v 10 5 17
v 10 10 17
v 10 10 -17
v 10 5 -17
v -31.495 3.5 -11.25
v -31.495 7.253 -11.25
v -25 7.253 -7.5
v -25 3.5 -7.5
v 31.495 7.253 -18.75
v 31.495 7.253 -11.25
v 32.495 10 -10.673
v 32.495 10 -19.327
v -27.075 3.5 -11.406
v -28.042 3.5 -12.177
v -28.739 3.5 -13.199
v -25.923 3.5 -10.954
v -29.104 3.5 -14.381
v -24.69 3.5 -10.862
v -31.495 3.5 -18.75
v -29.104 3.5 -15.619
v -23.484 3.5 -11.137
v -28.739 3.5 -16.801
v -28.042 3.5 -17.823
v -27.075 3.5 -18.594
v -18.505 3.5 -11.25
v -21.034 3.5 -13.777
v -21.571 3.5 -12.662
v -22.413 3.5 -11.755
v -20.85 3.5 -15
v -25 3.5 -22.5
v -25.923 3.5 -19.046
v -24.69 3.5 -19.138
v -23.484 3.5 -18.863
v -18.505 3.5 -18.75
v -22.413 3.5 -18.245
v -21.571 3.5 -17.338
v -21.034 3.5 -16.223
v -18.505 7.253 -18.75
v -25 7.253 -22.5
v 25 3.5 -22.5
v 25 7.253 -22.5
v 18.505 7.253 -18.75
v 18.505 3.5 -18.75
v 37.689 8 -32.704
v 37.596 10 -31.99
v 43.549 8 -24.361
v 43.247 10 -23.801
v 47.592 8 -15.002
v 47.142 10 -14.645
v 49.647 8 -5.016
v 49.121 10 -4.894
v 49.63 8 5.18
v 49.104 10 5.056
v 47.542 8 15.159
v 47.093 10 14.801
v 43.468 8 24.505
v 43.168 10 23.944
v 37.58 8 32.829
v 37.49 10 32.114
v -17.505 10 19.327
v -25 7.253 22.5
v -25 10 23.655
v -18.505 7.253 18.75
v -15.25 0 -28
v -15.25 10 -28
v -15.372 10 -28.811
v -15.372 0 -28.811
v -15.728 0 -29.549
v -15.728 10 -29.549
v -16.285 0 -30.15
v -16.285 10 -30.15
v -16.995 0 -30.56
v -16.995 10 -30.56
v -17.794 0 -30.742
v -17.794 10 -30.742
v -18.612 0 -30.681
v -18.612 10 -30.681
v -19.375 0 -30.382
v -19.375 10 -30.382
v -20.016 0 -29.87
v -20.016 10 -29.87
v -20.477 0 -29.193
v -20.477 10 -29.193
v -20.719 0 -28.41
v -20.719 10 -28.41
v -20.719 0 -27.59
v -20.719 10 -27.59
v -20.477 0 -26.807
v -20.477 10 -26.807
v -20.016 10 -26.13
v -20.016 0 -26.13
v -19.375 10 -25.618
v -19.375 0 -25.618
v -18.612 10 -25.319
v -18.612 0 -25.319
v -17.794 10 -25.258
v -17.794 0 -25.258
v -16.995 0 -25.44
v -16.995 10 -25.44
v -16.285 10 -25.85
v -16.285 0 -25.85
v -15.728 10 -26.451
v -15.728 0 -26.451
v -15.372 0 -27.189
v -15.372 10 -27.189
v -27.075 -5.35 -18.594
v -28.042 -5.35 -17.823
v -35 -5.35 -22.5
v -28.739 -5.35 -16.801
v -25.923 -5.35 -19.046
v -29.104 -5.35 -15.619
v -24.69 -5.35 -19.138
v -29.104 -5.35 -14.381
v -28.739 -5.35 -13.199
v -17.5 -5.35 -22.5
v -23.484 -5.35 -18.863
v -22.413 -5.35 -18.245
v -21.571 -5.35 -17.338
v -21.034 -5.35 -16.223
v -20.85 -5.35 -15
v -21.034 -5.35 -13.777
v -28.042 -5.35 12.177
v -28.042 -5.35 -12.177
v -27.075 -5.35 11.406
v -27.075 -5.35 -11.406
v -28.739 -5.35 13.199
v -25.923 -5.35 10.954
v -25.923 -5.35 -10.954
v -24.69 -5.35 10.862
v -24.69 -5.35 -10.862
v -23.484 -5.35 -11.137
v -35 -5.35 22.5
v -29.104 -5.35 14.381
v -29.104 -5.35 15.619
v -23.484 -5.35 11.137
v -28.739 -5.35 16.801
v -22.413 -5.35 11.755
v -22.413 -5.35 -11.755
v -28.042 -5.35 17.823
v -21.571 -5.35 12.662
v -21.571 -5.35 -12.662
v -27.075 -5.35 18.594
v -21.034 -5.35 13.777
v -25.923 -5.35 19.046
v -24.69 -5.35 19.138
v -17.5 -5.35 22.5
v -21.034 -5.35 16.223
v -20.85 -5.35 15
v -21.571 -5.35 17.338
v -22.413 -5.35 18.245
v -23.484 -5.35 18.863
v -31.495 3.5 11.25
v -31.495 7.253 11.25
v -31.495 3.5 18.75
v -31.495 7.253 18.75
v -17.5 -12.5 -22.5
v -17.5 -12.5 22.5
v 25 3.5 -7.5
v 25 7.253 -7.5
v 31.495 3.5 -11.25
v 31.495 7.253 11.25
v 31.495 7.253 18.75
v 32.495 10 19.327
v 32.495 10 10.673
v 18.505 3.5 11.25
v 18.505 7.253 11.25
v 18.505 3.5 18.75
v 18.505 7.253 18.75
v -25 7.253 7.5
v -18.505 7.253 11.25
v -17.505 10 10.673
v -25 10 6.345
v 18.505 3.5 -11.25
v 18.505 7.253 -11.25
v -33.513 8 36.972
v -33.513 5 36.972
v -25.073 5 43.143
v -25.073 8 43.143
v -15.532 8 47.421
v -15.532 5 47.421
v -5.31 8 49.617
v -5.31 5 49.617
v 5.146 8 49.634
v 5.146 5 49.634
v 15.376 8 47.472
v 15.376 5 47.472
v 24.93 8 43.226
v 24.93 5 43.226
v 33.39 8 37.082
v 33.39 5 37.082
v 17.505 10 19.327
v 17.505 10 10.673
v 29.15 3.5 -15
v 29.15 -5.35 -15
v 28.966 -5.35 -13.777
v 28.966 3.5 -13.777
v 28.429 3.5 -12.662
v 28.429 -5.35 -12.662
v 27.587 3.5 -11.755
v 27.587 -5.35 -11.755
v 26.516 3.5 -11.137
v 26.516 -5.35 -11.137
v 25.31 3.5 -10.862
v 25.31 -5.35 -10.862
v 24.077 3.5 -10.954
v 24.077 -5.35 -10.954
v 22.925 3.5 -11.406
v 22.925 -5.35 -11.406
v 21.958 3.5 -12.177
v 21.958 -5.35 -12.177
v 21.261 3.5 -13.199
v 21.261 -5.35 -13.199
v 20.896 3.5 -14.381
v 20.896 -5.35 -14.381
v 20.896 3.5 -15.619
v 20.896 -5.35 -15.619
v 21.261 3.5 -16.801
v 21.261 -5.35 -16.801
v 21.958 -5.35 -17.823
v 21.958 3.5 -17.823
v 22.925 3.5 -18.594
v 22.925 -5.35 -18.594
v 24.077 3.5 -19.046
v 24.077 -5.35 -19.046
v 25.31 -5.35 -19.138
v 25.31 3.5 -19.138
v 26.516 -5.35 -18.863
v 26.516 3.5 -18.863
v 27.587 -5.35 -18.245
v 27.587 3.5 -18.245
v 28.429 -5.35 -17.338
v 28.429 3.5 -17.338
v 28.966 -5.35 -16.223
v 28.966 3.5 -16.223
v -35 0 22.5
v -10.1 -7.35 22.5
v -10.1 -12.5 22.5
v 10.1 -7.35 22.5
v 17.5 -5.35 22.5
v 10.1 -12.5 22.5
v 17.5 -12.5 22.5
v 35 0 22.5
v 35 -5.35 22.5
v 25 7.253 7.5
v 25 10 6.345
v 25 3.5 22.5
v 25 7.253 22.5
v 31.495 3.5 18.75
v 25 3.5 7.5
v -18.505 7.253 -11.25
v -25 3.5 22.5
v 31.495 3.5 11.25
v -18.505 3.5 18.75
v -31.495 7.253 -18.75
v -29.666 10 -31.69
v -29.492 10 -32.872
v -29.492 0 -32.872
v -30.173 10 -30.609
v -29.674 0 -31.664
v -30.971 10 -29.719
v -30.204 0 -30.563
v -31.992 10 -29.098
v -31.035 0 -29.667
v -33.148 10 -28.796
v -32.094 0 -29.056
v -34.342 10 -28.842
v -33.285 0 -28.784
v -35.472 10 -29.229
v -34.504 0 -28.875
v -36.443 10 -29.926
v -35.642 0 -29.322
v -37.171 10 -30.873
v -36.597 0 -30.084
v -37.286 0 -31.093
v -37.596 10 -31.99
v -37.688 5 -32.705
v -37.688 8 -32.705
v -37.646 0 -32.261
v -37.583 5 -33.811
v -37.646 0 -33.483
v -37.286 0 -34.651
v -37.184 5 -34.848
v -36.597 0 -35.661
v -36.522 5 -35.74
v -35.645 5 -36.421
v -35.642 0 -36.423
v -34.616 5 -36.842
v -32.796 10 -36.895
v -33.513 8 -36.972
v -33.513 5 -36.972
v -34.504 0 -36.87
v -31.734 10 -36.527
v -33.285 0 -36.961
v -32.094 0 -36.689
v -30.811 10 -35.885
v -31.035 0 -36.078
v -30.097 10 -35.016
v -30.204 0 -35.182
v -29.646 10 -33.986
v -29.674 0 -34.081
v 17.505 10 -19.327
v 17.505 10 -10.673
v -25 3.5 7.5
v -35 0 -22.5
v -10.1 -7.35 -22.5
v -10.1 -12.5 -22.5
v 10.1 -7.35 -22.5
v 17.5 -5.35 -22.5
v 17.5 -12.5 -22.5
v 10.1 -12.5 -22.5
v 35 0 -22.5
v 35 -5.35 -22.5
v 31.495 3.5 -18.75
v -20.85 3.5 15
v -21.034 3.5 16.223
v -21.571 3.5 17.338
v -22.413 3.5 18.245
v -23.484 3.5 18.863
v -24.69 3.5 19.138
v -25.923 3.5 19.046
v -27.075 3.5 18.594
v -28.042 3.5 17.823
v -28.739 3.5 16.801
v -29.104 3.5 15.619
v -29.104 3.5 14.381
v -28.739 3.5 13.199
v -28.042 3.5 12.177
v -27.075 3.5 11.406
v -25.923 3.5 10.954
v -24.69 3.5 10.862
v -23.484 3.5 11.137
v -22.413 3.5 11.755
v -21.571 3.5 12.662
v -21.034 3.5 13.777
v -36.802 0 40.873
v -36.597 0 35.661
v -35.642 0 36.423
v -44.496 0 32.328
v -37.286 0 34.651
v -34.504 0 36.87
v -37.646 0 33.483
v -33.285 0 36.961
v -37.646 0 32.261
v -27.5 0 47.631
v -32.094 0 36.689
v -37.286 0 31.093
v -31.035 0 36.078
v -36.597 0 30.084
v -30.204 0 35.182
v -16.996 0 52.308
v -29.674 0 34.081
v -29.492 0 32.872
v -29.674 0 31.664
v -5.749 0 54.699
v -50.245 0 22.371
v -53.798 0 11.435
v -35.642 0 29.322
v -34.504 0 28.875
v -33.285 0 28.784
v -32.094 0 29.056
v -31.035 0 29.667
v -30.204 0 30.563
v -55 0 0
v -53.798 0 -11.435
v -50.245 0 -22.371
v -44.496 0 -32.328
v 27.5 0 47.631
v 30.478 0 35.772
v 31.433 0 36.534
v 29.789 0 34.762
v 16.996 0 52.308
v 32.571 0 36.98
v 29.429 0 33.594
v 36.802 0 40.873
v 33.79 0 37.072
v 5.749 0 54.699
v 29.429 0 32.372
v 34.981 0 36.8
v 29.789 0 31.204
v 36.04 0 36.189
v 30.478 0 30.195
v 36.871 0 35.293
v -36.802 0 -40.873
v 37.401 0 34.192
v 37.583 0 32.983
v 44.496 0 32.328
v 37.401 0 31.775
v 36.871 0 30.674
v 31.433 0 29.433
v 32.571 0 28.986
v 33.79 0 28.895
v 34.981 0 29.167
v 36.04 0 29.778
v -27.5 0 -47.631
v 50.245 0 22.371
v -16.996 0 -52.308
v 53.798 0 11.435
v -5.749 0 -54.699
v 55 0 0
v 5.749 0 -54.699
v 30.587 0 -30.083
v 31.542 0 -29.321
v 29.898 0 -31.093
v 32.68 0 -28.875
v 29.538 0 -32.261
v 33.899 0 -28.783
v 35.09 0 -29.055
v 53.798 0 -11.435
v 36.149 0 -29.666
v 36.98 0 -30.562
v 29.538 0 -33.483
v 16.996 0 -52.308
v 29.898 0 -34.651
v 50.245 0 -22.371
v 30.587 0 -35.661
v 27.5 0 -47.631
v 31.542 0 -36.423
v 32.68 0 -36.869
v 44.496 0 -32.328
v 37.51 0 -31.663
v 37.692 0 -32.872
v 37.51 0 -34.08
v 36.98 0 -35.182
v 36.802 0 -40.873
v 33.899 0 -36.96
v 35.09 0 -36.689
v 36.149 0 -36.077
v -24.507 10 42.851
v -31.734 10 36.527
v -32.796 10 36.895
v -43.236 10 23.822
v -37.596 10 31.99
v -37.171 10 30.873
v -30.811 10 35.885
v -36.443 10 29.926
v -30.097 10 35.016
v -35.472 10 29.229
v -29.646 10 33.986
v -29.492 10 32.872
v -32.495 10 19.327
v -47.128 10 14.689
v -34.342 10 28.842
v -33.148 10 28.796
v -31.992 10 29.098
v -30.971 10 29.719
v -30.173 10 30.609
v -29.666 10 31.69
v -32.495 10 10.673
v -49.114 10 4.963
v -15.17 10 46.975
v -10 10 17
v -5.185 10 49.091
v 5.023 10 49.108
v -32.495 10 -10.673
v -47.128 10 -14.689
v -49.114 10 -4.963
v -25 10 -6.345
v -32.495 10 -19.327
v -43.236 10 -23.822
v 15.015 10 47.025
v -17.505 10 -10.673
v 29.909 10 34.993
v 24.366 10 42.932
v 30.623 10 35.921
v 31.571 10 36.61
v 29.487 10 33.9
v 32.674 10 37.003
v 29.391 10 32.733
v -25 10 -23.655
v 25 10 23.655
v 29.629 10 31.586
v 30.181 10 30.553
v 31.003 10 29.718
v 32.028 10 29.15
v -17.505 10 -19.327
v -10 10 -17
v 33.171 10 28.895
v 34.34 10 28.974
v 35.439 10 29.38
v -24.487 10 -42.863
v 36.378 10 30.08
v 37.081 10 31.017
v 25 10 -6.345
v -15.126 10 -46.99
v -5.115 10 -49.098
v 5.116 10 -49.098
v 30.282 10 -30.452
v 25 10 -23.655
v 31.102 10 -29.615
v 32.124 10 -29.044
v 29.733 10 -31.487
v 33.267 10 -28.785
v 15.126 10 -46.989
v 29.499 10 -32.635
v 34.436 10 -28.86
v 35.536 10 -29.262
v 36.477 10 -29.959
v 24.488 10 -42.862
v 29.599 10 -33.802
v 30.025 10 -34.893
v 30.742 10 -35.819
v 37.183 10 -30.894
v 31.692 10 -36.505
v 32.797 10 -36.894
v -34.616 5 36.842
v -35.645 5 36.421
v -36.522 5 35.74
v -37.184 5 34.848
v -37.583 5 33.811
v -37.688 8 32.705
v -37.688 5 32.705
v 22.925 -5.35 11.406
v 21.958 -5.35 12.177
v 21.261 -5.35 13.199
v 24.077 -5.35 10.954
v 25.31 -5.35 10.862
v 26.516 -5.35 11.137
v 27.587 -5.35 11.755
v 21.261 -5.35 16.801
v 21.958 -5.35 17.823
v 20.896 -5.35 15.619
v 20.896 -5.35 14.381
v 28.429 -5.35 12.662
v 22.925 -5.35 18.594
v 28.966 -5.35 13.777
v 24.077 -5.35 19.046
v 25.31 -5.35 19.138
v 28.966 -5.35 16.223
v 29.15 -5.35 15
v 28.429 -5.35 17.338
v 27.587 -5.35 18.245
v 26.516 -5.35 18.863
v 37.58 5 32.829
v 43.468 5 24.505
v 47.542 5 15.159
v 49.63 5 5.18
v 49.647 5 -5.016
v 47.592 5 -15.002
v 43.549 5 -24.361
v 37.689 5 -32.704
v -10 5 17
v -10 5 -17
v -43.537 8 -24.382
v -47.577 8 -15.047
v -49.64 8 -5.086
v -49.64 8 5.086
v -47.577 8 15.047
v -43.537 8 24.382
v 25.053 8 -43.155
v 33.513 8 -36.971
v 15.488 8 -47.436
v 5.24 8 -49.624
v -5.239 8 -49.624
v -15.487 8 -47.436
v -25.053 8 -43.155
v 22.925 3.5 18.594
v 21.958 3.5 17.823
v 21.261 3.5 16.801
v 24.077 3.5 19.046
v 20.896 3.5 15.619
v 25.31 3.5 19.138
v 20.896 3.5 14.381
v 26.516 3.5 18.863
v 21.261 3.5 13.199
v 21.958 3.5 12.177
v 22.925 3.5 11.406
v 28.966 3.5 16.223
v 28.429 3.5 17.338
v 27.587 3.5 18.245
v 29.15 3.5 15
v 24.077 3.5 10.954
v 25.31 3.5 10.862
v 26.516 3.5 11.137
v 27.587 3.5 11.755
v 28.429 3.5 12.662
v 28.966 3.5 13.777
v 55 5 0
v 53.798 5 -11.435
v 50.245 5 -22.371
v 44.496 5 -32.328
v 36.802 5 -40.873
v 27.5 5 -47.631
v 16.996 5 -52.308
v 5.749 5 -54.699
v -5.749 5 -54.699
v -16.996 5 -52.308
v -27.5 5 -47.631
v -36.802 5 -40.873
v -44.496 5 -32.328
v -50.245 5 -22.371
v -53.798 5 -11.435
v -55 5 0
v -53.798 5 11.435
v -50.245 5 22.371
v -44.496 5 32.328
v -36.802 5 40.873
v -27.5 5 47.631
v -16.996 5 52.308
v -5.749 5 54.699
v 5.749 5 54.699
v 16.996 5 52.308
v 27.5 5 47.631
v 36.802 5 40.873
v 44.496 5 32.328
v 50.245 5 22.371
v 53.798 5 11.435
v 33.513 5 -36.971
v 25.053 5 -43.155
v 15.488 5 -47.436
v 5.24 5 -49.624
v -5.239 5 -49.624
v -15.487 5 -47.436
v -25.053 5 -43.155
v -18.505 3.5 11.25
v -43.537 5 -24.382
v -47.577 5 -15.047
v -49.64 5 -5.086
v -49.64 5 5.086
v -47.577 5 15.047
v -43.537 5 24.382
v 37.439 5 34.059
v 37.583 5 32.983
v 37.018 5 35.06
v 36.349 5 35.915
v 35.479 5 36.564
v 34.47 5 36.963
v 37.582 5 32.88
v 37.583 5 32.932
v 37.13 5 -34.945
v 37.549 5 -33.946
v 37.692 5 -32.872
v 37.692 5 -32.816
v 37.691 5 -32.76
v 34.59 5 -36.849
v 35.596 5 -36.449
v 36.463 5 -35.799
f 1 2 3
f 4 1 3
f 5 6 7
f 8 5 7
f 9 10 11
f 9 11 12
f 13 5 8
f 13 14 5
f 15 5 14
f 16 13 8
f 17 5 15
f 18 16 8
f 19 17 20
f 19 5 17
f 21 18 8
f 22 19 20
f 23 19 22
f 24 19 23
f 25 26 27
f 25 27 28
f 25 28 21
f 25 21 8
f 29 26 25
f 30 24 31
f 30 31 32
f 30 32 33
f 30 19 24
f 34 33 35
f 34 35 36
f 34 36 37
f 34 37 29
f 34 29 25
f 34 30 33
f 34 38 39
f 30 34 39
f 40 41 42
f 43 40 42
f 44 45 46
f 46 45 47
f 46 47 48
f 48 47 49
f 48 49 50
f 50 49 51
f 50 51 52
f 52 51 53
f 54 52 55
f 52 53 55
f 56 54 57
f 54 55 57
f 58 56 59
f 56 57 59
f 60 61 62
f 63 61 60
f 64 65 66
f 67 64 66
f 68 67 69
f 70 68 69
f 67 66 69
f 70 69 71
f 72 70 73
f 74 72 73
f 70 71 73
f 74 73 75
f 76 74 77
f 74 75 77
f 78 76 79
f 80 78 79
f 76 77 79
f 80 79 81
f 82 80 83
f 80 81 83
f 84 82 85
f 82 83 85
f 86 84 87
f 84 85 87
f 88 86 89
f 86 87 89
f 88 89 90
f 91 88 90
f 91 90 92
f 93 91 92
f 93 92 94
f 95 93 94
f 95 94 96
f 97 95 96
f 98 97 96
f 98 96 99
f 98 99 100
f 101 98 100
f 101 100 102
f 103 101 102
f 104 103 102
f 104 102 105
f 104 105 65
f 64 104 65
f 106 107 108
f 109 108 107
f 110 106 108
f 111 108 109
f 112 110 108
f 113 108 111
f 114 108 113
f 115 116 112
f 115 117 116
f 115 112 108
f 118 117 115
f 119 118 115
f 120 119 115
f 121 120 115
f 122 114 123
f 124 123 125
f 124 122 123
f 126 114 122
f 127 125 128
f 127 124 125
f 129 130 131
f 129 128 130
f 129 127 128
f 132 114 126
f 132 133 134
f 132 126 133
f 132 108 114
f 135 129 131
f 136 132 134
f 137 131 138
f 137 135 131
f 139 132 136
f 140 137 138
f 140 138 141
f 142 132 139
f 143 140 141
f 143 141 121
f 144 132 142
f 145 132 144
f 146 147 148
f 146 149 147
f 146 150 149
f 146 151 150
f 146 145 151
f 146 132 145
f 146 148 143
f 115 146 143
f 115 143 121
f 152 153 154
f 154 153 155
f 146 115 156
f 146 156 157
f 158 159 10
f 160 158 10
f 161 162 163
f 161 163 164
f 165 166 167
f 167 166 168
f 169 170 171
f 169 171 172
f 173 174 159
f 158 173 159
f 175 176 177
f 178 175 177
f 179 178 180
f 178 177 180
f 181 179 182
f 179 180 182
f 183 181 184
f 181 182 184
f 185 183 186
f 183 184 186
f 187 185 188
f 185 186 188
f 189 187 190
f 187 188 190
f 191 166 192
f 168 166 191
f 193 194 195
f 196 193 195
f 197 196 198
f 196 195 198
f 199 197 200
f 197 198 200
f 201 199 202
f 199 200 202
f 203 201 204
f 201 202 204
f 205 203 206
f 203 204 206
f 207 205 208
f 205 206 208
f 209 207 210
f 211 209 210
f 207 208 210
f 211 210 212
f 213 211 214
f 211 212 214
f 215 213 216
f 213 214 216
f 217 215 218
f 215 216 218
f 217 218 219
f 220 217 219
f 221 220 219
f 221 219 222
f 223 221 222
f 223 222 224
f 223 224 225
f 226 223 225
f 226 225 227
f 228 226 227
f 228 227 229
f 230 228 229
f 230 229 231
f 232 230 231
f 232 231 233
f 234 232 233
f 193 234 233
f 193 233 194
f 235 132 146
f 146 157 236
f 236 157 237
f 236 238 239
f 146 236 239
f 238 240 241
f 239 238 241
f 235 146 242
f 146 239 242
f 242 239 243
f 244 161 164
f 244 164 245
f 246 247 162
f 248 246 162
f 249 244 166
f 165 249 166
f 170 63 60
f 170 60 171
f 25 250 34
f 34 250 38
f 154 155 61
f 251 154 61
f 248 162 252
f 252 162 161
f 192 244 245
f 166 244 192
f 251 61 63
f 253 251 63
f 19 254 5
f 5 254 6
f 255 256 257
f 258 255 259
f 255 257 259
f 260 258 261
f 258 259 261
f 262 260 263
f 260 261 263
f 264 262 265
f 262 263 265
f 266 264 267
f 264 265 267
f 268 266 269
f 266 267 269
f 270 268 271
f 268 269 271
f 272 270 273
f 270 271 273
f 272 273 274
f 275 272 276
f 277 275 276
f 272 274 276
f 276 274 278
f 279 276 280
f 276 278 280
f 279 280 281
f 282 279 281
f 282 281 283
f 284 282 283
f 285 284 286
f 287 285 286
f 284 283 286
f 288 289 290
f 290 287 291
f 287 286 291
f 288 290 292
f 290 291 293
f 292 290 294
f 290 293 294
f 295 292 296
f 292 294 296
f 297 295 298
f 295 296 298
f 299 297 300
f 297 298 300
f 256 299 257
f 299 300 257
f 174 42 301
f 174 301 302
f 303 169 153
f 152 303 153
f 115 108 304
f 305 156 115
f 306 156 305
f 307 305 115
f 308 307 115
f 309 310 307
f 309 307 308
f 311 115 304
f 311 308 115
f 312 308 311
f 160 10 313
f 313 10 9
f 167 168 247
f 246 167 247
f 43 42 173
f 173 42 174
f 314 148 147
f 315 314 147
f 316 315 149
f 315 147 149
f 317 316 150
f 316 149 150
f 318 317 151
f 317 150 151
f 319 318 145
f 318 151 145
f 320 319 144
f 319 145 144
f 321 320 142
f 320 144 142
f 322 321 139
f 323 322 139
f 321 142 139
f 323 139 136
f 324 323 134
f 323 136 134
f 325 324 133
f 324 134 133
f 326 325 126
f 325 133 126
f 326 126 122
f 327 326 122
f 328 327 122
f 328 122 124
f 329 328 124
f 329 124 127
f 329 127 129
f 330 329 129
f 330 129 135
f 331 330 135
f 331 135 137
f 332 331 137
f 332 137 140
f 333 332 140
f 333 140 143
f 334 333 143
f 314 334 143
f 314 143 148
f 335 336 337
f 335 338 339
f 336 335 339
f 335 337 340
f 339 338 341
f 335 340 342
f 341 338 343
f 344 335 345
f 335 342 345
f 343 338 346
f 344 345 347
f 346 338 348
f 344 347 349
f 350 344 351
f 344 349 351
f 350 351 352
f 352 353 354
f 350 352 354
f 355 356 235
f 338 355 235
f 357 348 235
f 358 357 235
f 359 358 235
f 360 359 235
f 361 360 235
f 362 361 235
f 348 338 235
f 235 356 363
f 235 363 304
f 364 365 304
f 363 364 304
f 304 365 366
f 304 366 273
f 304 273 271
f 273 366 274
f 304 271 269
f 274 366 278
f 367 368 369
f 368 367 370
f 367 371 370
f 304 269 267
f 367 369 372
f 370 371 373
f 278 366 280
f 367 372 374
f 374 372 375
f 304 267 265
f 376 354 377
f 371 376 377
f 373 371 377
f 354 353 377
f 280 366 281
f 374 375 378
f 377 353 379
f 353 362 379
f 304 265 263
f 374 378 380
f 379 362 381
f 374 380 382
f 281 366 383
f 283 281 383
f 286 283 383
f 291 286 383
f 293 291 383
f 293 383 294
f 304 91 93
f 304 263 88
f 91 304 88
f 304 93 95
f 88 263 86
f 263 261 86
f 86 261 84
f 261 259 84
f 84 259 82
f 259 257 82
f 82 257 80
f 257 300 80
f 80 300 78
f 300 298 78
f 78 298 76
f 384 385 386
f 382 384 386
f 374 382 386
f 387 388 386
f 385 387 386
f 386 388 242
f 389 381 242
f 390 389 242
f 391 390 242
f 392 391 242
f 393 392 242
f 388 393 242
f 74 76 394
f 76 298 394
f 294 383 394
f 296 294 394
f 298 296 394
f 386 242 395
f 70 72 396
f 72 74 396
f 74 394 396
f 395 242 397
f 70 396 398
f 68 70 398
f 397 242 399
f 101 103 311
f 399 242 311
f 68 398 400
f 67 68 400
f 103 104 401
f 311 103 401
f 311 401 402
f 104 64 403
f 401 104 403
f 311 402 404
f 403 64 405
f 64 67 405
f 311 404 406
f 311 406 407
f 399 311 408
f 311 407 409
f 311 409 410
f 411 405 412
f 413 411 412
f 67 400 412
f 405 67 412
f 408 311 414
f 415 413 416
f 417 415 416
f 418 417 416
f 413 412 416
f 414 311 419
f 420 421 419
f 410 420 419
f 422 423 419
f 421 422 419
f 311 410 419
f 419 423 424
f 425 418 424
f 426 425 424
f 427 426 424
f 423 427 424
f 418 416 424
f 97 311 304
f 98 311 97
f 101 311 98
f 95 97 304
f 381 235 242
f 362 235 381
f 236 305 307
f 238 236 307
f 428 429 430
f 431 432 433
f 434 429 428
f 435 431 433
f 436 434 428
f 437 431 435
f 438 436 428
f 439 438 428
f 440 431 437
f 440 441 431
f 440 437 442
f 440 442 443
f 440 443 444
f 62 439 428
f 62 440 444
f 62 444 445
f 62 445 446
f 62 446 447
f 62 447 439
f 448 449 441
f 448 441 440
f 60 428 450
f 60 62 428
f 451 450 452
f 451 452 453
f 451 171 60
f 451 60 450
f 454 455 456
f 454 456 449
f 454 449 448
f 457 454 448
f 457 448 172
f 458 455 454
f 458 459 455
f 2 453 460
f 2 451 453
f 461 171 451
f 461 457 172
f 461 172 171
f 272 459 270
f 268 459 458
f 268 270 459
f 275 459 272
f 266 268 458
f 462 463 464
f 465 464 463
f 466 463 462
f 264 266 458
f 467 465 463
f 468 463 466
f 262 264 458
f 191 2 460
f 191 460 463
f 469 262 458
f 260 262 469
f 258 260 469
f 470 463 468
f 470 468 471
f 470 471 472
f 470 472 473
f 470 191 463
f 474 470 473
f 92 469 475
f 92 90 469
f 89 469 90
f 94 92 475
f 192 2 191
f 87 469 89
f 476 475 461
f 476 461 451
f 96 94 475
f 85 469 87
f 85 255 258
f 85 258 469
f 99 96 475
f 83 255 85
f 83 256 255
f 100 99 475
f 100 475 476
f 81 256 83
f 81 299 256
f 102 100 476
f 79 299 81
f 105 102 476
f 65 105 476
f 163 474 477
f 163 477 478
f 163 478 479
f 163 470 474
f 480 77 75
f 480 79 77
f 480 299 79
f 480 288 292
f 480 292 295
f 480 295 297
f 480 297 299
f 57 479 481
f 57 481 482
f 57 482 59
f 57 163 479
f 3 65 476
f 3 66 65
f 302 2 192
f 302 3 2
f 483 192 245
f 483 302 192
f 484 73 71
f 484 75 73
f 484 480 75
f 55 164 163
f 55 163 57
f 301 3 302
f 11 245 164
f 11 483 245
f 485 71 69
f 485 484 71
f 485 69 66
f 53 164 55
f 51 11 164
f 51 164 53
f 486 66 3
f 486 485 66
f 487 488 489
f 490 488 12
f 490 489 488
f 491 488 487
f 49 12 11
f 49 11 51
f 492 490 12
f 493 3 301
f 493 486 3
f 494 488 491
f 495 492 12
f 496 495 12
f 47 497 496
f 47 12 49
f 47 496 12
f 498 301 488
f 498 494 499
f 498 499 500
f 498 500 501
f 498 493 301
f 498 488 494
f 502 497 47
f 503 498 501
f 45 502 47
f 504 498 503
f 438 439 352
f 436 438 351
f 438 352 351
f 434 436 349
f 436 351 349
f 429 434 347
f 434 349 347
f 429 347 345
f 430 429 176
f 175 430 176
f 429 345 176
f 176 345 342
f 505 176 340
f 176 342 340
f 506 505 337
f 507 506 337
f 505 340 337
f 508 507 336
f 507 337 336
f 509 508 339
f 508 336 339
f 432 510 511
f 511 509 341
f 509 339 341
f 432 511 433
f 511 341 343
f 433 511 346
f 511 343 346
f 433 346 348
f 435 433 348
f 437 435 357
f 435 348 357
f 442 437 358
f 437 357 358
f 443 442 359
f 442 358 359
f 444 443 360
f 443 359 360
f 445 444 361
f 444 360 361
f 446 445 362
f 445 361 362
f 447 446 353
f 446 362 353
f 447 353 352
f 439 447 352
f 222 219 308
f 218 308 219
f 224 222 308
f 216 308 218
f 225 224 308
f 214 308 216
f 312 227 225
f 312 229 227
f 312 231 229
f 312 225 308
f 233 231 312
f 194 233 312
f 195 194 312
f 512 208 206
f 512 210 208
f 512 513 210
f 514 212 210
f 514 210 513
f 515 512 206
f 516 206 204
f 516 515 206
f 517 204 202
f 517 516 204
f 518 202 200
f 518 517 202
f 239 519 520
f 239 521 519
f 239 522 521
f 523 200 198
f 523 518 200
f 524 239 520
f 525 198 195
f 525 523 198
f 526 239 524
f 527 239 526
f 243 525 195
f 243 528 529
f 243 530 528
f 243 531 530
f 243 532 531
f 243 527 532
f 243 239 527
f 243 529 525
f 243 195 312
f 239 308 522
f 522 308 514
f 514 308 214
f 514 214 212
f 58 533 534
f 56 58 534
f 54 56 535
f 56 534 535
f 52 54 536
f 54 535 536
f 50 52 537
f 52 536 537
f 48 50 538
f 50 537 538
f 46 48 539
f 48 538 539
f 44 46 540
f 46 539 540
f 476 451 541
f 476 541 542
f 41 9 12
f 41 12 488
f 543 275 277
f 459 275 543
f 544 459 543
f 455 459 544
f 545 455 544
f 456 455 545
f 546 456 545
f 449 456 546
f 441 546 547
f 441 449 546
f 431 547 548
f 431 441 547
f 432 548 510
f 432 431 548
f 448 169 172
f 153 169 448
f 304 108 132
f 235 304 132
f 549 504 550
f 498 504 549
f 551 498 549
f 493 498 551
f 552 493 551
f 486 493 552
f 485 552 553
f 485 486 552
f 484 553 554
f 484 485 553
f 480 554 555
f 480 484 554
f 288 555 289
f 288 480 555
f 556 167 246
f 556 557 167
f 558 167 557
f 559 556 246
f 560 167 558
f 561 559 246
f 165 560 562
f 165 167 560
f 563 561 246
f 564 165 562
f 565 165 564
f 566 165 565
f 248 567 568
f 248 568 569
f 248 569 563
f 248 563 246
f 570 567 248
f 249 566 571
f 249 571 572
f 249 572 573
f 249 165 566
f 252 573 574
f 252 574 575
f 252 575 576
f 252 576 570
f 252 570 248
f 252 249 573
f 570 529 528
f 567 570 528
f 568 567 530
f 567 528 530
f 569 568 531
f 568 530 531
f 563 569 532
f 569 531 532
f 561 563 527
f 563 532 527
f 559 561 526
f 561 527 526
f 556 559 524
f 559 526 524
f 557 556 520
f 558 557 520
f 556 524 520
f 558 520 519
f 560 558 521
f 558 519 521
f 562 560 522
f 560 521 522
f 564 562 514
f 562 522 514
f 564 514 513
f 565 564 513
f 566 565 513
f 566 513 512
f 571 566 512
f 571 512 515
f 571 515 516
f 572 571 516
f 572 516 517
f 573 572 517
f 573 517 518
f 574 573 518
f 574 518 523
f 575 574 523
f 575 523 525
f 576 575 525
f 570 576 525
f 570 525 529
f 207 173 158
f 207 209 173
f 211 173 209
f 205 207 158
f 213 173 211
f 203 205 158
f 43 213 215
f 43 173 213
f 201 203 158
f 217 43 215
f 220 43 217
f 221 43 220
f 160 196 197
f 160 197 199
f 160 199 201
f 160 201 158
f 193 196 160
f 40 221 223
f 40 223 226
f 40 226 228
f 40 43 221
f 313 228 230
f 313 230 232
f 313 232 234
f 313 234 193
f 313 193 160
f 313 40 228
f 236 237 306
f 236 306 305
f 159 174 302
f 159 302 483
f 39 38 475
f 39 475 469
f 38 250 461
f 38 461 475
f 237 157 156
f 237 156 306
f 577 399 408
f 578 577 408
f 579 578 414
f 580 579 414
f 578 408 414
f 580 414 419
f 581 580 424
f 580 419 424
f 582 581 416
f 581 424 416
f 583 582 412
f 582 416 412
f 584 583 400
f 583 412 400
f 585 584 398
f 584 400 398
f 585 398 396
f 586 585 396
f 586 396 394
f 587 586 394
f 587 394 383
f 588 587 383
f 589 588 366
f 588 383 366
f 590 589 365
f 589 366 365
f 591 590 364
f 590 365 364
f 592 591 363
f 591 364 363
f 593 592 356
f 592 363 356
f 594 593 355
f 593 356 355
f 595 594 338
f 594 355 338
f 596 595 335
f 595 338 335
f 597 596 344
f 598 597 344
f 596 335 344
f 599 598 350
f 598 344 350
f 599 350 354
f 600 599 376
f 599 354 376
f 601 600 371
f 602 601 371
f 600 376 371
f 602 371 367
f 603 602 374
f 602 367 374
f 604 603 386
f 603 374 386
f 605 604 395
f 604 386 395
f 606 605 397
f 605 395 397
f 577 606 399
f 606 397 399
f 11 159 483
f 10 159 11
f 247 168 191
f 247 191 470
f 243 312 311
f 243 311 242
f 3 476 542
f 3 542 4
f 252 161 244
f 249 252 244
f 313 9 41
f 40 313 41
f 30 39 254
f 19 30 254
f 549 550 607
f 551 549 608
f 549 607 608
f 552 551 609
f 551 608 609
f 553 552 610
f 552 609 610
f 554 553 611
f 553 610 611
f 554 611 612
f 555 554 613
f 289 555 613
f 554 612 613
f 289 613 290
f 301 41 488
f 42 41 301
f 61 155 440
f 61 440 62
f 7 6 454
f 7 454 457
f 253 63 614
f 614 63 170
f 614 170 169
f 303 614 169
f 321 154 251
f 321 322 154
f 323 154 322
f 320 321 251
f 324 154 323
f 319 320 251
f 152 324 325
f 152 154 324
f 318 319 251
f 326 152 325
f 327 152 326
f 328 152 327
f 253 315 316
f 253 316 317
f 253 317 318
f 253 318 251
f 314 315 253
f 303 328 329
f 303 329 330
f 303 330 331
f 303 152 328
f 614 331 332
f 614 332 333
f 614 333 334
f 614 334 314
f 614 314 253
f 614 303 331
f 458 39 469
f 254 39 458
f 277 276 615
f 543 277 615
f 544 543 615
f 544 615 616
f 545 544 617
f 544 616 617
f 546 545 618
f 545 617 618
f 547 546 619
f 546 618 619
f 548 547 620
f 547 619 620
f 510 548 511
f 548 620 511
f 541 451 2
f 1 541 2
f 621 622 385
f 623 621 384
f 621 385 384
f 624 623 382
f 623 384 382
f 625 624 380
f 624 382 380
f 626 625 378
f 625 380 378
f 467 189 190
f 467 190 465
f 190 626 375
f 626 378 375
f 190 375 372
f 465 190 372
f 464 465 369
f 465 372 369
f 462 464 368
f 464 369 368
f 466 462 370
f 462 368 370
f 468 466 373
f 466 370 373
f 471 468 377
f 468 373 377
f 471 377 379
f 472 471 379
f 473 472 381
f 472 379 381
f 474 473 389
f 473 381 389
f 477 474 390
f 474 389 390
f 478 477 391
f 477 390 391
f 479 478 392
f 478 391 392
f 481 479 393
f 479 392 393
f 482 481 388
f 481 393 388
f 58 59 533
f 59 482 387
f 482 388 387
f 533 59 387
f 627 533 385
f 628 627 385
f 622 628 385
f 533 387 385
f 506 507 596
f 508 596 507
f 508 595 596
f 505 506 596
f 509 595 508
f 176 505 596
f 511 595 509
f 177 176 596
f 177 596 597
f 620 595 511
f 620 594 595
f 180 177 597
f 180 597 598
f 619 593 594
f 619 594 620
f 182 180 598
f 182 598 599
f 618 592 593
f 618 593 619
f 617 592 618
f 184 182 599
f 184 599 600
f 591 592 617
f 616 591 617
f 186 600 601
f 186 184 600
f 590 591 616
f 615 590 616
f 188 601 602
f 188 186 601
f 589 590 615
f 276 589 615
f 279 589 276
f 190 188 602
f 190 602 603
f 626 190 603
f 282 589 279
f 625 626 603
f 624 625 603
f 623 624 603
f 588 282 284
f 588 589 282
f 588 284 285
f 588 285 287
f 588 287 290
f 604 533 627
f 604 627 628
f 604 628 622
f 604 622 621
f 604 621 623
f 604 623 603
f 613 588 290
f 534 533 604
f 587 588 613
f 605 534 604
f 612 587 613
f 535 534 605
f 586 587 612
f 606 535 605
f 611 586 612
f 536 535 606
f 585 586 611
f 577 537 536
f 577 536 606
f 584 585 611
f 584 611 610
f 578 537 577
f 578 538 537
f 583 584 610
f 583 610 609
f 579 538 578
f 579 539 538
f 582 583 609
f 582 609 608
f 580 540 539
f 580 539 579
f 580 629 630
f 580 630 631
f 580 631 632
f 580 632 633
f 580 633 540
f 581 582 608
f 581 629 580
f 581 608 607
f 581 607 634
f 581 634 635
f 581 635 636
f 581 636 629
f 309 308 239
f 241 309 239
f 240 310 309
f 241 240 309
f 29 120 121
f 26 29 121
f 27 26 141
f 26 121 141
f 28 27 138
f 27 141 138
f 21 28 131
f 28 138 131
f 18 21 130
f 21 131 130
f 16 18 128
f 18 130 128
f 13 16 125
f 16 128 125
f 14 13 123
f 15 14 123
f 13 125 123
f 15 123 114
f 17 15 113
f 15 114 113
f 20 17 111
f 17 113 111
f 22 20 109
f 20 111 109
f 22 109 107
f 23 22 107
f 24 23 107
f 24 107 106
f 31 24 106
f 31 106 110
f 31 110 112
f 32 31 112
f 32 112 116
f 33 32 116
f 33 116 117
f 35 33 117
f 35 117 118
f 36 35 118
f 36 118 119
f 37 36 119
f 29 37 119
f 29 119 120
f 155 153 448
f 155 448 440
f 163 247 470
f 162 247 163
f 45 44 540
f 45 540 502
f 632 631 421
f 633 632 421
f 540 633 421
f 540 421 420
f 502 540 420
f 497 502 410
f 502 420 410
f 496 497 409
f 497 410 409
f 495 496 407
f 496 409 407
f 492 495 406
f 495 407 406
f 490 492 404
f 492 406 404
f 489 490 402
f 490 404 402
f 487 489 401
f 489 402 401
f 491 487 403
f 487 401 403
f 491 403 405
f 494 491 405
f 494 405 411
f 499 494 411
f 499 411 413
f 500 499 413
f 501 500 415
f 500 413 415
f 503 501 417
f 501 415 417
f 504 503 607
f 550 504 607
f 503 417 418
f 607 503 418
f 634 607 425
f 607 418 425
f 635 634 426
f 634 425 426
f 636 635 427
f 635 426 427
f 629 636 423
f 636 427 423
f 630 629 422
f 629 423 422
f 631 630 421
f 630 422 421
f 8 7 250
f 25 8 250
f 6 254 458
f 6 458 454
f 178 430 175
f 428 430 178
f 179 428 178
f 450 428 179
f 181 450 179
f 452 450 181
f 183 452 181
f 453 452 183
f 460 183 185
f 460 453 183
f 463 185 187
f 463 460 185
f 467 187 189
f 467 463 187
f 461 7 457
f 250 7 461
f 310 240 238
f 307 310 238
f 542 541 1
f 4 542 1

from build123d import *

# Parameters (mm, degrees)
SKETCH_1_R            = 55
EXTRUDE_1_DEPTH       = 5
SKETCH_2_R            = 49.9
EXTRUDE_2_DEPTH       = 5
SKETCH_3_W            = 35
SKETCH_3_H            = 45
EXTRUDE_3_DEPTH       = 25
SKETCH_4_W            = 20.2
SKETCH_4_H            = 10.3
CUT_EXTRUDE_1_DEPTH   = 78.5
SKETCH_5_R            = 4.1
CUT_EXTRUDE_2_DEPTH   = 11
SKETCH_6_R            = 2.75
CUT_EXTRUDE_3_DEPTH   = 36
CHAMFER1_SIZE         = 2
CHAMFER1_SIZE2        = 0.535898385
CHAMFER1_PART_2_SIZE  = 2
CHAMFER1_PART_2_SIZE2 = 0.535898385
CHAMFER1_PART_3_SIZE  = 2
CHAMFER1_PART_3_SIZE2 = 0.535898385
CHAMFER1_PART_4_SIZE  = 2
CHAMFER1_PART_4_SIZE2 = 0.535898385
SKETCH2_W             = 35.065209797
SKETCH2_H             = 45
CUT_EXTRUDE1_DEPTH    = 12.5
BOSS_EXTRUDE1_START   = -2
SKETCH4_W             = 70
SKETCH4_H             = 45
BOSS_EXTRUDE1_DEPTH   = 5.35
SKETCH5_R             = 4.15
CUT_EXTRUDE2_DEPTH    = 16.3500001
CUT_EXTRUDE3_DEPTH    = 6.5
SKETCH7_W             = 20
SKETCH7_H             = 34
CUT_EXTRUDE4_DEPTH    = 5
CHAMFER2_SIZE         = 1
CHAMFER2_SIZE2        = 2.747477419


with BuildPart() as part:
    # Эскиз1 → Бобышка-Вытянуть1 (new body)
    with BuildSketch(Plane(origin=(0, 0, 0), x_dir=(1, 0, 0), z_dir=(0, 1, 0))):
        Circle(SKETCH_1_R)
    extrude(amount=EXTRUDE_1_DEPTH)

    # Эскиз2 → Бобышка-Вытянуть2 (add)
    with BuildSketch(Plane(origin=(0, 5, 0), x_dir=(1, 0, 0), z_dir=(0, 1, 0))):
        Circle(SKETCH_2_R)
    extrude(amount=EXTRUDE_2_DEPTH)

    # Эскиз3 → Бобышка-Вытянуть3 (add)
    with BuildSketch(Plane.XZ):
        Rectangle(SKETCH_3_W, SKETCH_3_H)
    extrude(amount=EXTRUDE_3_DEPTH)

    # Эскиз4 → Вырез-Вытянуть1 (cut, through all)
    with BuildSketch(Plane.XY.offset(22.5)):
        with Locations((0, -12.5)):
            Rectangle(SKETCH_4_W, SKETCH_4_H)
    extrude(amount=-CUT_EXTRUDE_1_DEPTH, mode=Mode.SUBTRACT)

    # Эскиз5 → Вырез-Вытянуть2 (cut, through all)
    with BuildSketch(Plane.XZ):
        with Locations((33.592198598, -32.871936263)):
            Circle(SKETCH_5_R)
        with Locations((-33.591727056, -32.872418125)):
            Circle(SKETCH_5_R)
        with Locations((-33.591727056, 32.872418125)):
            Circle(SKETCH_5_R)
        with Locations((33.483215177, 32.983215177)):
            Circle(SKETCH_5_R)
    extrude(amount=-CUT_EXTRUDE_2_DEPTH, mode=Mode.SUBTRACT)

    # Эскиз6 → Вырез-Вытянуть3 (cut, through all)
    with BuildSketch(Plane(origin=(0, 10, 0), x_dir=(1, 0, 0), z_dir=(0, 1, 0))):
        with Locations((-17.999799176, 27.999999999)):
            Circle(SKETCH_6_R)
    extrude(amount=-CUT_EXTRUDE_3_DEPTH, mode=Mode.SUBTRACT)

    # Chamfer1
    chamfer1_edges = [part.edges().sort_by_distance(p)[0] for p in [
        (0.000357897, 10, -49.899999999),
    ]]
    chamfer1_side = [part.faces().sort_by_distance(p)[0] for p in [
        (0.000357897, 7.5, -49.899999999),
    ]]
    chamfer(chamfer1_edges, length=CHAMFER1_SIZE, length2=CHAMFER1_SIZE2, reference=chamfer1_side[0])

    # Chamfer1 part 2
    chamfer1_part_2_edges = [part.edges().sort_by_distance(p)[0] for p in [
        (-49.9, 10, 0),
    ]]
    chamfer1_part_2_side = [part.faces().sort_by_distance(p)[0] for p in [
        (-49.9, 7.5, 0),
    ]]
    chamfer(chamfer1_part_2_edges, length=CHAMFER1_PART_2_SIZE, length2=CHAMFER1_PART_2_SIZE2, reference=chamfer1_part_2_side[0])

    # Chamfer1 part 3
    chamfer1_part_3_edges = [part.edges().sort_by_distance(p)[0] for p in [
        (-0.08242255, 10, 49.899931929),
    ]]
    chamfer1_part_3_side = [part.faces().sort_by_distance(p)[0] for p in [
        (-0.08242255, 7.5, 49.899931929),
    ]]
    chamfer(chamfer1_part_3_edges, length=CHAMFER1_PART_3_SIZE, length2=CHAMFER1_PART_3_SIZE2, reference=chamfer1_part_3_side[0])

    # Chamfer1 part 4
    chamfer1_part_4_edges = [part.edges().sort_by_distance(p)[0] for p in [
        (49.899931657, 10, 0.082587101),
    ]]
    chamfer1_part_4_side = [part.faces().sort_by_distance(p)[0] for p in [
        (49.899931657, 7.5, 0.082587101),
    ]]
    chamfer(chamfer1_part_4_edges, length=CHAMFER1_PART_4_SIZE, length2=CHAMFER1_PART_4_SIZE2, reference=chamfer1_part_4_side[0])

    # Sketch2 → Cut-Extrude1 (cut)
    with BuildSketch(Plane.XZ.offset(25)):
        with Locations((-0.032604899, 0)):
            Rectangle(SKETCH2_W, SKETCH2_H)
    extrude(amount=-CUT_EXTRUDE1_DEPTH, mode=Mode.SUBTRACT)

    # Sketch4 → Boss-Extrude1 (add)
    with BuildSketch(Plane.XZ.offset(7.35).offset(BOSS_EXTRUDE1_START)):
        Rectangle(SKETCH4_W, SKETCH4_H)
    extrude(amount=-BOSS_EXTRUDE1_DEPTH)

    # Sketch5 → Cut-Extrude2 (cut, through all)
    with BuildSketch(Plane.XZ.offset(5.35)):
        with Locations((25, 15)):
            Circle(SKETCH5_R)
        with Locations((-25, 15)):
            Circle(SKETCH5_R)
        with Locations((25, -15)):
            Circle(SKETCH5_R)
        with Locations((-25, -15)):
            Circle(SKETCH5_R)
    extrude(amount=-CUT_EXTRUDE2_DEPTH, mode=Mode.SUBTRACT)

    # Sketch6 → Cut-Extrude3 (cut)
    with BuildSketch(Plane(origin=(0, 10, 0), x_dir=(1, 0, 0), z_dir=(0, 1, 0))):
        Polygon((-18.504809472, -11.25), (-25, -7.5), (-31.495190528, -11.25), (-31.495190528, -18.75), (-25, -22.5), (-18.504809472, -18.75), align=None)
        Polygon((31.495190528, -11.25), (25, -7.5), (18.504809472, -11.25), (18.504809472, -18.75), (25, -22.5), (31.495190528, -18.75), align=None)
        Polygon((31.495190528, 18.75), (25, 22.5), (18.504809472, 18.75), (18.504809472, 11.25), (25, 7.5), (31.495190528, 11.25), align=None)
        Polygon((-18.504809472, 18.75), (-25, 22.5), (-31.495190528, 18.75), (-31.495190528, 11.25), (-25, 7.5), (-18.504809472, 11.25), align=None)
    extrude(amount=-CUT_EXTRUDE3_DEPTH, mode=Mode.SUBTRACT)

    # Sketch7 → Cut-Extrude4 (cut)
    with BuildSketch(Plane(origin=(0, 10, 0), x_dir=(1, 0, 0), z_dir=(0, 1, 0))):
        Rectangle(SKETCH7_W, SKETCH7_H)
    extrude(amount=-CUT_EXTRUDE4_DEPTH, mode=Mode.SUBTRACT)

    # Chamfer2
    chamfer2_edges = [part.edges().sort_by_distance(p)[0] for p in [
        (-18.504809472, 10, 15),
        (-21.752404736, 10, 9.375),
        (-28.247595264, 10, 9.375),
        (-31.495190528, 10, 15),
        (-28.247595264, 10, 20.625),
        (-21.752404736, 10, 20.625),
        (31.495190528, 10, 15),
        (28.247595264, 10, 9.375),
        (21.752404736, 10, 9.375),
        (18.504809472, 10, 15),
        (21.752404736, 10, 20.625),
        (28.247595264, 10, 20.625),
        (31.495190528, 10, -15),
        (28.247595264, 10, -20.625),
        (21.752404736, 10, -20.625),
        (18.504809472, 10, -15),
        (21.752404736, 10, -9.375),
        (28.247595264, 10, -9.375),
        (-18.504809472, 10, -15),
        (-21.752404736, 10, -20.625),
        (-28.247595264, 10, -20.625),
        (-31.495190528, 10, -15),
        (-28.247595264, 10, -9.375),
        (-21.752404736, 10, -9.375),
    ]]
    chamfer2_side = [part.faces().sort_by_distance(p)[0] for p in [
        (29.567670169, 10, 29.126140435),
    ]]
    chamfer(chamfer2_edges, length=CHAMFER2_SIZE, length2=CHAMFER2_SIZE2, reference=chamfer2_side[0])


solid = part.part
